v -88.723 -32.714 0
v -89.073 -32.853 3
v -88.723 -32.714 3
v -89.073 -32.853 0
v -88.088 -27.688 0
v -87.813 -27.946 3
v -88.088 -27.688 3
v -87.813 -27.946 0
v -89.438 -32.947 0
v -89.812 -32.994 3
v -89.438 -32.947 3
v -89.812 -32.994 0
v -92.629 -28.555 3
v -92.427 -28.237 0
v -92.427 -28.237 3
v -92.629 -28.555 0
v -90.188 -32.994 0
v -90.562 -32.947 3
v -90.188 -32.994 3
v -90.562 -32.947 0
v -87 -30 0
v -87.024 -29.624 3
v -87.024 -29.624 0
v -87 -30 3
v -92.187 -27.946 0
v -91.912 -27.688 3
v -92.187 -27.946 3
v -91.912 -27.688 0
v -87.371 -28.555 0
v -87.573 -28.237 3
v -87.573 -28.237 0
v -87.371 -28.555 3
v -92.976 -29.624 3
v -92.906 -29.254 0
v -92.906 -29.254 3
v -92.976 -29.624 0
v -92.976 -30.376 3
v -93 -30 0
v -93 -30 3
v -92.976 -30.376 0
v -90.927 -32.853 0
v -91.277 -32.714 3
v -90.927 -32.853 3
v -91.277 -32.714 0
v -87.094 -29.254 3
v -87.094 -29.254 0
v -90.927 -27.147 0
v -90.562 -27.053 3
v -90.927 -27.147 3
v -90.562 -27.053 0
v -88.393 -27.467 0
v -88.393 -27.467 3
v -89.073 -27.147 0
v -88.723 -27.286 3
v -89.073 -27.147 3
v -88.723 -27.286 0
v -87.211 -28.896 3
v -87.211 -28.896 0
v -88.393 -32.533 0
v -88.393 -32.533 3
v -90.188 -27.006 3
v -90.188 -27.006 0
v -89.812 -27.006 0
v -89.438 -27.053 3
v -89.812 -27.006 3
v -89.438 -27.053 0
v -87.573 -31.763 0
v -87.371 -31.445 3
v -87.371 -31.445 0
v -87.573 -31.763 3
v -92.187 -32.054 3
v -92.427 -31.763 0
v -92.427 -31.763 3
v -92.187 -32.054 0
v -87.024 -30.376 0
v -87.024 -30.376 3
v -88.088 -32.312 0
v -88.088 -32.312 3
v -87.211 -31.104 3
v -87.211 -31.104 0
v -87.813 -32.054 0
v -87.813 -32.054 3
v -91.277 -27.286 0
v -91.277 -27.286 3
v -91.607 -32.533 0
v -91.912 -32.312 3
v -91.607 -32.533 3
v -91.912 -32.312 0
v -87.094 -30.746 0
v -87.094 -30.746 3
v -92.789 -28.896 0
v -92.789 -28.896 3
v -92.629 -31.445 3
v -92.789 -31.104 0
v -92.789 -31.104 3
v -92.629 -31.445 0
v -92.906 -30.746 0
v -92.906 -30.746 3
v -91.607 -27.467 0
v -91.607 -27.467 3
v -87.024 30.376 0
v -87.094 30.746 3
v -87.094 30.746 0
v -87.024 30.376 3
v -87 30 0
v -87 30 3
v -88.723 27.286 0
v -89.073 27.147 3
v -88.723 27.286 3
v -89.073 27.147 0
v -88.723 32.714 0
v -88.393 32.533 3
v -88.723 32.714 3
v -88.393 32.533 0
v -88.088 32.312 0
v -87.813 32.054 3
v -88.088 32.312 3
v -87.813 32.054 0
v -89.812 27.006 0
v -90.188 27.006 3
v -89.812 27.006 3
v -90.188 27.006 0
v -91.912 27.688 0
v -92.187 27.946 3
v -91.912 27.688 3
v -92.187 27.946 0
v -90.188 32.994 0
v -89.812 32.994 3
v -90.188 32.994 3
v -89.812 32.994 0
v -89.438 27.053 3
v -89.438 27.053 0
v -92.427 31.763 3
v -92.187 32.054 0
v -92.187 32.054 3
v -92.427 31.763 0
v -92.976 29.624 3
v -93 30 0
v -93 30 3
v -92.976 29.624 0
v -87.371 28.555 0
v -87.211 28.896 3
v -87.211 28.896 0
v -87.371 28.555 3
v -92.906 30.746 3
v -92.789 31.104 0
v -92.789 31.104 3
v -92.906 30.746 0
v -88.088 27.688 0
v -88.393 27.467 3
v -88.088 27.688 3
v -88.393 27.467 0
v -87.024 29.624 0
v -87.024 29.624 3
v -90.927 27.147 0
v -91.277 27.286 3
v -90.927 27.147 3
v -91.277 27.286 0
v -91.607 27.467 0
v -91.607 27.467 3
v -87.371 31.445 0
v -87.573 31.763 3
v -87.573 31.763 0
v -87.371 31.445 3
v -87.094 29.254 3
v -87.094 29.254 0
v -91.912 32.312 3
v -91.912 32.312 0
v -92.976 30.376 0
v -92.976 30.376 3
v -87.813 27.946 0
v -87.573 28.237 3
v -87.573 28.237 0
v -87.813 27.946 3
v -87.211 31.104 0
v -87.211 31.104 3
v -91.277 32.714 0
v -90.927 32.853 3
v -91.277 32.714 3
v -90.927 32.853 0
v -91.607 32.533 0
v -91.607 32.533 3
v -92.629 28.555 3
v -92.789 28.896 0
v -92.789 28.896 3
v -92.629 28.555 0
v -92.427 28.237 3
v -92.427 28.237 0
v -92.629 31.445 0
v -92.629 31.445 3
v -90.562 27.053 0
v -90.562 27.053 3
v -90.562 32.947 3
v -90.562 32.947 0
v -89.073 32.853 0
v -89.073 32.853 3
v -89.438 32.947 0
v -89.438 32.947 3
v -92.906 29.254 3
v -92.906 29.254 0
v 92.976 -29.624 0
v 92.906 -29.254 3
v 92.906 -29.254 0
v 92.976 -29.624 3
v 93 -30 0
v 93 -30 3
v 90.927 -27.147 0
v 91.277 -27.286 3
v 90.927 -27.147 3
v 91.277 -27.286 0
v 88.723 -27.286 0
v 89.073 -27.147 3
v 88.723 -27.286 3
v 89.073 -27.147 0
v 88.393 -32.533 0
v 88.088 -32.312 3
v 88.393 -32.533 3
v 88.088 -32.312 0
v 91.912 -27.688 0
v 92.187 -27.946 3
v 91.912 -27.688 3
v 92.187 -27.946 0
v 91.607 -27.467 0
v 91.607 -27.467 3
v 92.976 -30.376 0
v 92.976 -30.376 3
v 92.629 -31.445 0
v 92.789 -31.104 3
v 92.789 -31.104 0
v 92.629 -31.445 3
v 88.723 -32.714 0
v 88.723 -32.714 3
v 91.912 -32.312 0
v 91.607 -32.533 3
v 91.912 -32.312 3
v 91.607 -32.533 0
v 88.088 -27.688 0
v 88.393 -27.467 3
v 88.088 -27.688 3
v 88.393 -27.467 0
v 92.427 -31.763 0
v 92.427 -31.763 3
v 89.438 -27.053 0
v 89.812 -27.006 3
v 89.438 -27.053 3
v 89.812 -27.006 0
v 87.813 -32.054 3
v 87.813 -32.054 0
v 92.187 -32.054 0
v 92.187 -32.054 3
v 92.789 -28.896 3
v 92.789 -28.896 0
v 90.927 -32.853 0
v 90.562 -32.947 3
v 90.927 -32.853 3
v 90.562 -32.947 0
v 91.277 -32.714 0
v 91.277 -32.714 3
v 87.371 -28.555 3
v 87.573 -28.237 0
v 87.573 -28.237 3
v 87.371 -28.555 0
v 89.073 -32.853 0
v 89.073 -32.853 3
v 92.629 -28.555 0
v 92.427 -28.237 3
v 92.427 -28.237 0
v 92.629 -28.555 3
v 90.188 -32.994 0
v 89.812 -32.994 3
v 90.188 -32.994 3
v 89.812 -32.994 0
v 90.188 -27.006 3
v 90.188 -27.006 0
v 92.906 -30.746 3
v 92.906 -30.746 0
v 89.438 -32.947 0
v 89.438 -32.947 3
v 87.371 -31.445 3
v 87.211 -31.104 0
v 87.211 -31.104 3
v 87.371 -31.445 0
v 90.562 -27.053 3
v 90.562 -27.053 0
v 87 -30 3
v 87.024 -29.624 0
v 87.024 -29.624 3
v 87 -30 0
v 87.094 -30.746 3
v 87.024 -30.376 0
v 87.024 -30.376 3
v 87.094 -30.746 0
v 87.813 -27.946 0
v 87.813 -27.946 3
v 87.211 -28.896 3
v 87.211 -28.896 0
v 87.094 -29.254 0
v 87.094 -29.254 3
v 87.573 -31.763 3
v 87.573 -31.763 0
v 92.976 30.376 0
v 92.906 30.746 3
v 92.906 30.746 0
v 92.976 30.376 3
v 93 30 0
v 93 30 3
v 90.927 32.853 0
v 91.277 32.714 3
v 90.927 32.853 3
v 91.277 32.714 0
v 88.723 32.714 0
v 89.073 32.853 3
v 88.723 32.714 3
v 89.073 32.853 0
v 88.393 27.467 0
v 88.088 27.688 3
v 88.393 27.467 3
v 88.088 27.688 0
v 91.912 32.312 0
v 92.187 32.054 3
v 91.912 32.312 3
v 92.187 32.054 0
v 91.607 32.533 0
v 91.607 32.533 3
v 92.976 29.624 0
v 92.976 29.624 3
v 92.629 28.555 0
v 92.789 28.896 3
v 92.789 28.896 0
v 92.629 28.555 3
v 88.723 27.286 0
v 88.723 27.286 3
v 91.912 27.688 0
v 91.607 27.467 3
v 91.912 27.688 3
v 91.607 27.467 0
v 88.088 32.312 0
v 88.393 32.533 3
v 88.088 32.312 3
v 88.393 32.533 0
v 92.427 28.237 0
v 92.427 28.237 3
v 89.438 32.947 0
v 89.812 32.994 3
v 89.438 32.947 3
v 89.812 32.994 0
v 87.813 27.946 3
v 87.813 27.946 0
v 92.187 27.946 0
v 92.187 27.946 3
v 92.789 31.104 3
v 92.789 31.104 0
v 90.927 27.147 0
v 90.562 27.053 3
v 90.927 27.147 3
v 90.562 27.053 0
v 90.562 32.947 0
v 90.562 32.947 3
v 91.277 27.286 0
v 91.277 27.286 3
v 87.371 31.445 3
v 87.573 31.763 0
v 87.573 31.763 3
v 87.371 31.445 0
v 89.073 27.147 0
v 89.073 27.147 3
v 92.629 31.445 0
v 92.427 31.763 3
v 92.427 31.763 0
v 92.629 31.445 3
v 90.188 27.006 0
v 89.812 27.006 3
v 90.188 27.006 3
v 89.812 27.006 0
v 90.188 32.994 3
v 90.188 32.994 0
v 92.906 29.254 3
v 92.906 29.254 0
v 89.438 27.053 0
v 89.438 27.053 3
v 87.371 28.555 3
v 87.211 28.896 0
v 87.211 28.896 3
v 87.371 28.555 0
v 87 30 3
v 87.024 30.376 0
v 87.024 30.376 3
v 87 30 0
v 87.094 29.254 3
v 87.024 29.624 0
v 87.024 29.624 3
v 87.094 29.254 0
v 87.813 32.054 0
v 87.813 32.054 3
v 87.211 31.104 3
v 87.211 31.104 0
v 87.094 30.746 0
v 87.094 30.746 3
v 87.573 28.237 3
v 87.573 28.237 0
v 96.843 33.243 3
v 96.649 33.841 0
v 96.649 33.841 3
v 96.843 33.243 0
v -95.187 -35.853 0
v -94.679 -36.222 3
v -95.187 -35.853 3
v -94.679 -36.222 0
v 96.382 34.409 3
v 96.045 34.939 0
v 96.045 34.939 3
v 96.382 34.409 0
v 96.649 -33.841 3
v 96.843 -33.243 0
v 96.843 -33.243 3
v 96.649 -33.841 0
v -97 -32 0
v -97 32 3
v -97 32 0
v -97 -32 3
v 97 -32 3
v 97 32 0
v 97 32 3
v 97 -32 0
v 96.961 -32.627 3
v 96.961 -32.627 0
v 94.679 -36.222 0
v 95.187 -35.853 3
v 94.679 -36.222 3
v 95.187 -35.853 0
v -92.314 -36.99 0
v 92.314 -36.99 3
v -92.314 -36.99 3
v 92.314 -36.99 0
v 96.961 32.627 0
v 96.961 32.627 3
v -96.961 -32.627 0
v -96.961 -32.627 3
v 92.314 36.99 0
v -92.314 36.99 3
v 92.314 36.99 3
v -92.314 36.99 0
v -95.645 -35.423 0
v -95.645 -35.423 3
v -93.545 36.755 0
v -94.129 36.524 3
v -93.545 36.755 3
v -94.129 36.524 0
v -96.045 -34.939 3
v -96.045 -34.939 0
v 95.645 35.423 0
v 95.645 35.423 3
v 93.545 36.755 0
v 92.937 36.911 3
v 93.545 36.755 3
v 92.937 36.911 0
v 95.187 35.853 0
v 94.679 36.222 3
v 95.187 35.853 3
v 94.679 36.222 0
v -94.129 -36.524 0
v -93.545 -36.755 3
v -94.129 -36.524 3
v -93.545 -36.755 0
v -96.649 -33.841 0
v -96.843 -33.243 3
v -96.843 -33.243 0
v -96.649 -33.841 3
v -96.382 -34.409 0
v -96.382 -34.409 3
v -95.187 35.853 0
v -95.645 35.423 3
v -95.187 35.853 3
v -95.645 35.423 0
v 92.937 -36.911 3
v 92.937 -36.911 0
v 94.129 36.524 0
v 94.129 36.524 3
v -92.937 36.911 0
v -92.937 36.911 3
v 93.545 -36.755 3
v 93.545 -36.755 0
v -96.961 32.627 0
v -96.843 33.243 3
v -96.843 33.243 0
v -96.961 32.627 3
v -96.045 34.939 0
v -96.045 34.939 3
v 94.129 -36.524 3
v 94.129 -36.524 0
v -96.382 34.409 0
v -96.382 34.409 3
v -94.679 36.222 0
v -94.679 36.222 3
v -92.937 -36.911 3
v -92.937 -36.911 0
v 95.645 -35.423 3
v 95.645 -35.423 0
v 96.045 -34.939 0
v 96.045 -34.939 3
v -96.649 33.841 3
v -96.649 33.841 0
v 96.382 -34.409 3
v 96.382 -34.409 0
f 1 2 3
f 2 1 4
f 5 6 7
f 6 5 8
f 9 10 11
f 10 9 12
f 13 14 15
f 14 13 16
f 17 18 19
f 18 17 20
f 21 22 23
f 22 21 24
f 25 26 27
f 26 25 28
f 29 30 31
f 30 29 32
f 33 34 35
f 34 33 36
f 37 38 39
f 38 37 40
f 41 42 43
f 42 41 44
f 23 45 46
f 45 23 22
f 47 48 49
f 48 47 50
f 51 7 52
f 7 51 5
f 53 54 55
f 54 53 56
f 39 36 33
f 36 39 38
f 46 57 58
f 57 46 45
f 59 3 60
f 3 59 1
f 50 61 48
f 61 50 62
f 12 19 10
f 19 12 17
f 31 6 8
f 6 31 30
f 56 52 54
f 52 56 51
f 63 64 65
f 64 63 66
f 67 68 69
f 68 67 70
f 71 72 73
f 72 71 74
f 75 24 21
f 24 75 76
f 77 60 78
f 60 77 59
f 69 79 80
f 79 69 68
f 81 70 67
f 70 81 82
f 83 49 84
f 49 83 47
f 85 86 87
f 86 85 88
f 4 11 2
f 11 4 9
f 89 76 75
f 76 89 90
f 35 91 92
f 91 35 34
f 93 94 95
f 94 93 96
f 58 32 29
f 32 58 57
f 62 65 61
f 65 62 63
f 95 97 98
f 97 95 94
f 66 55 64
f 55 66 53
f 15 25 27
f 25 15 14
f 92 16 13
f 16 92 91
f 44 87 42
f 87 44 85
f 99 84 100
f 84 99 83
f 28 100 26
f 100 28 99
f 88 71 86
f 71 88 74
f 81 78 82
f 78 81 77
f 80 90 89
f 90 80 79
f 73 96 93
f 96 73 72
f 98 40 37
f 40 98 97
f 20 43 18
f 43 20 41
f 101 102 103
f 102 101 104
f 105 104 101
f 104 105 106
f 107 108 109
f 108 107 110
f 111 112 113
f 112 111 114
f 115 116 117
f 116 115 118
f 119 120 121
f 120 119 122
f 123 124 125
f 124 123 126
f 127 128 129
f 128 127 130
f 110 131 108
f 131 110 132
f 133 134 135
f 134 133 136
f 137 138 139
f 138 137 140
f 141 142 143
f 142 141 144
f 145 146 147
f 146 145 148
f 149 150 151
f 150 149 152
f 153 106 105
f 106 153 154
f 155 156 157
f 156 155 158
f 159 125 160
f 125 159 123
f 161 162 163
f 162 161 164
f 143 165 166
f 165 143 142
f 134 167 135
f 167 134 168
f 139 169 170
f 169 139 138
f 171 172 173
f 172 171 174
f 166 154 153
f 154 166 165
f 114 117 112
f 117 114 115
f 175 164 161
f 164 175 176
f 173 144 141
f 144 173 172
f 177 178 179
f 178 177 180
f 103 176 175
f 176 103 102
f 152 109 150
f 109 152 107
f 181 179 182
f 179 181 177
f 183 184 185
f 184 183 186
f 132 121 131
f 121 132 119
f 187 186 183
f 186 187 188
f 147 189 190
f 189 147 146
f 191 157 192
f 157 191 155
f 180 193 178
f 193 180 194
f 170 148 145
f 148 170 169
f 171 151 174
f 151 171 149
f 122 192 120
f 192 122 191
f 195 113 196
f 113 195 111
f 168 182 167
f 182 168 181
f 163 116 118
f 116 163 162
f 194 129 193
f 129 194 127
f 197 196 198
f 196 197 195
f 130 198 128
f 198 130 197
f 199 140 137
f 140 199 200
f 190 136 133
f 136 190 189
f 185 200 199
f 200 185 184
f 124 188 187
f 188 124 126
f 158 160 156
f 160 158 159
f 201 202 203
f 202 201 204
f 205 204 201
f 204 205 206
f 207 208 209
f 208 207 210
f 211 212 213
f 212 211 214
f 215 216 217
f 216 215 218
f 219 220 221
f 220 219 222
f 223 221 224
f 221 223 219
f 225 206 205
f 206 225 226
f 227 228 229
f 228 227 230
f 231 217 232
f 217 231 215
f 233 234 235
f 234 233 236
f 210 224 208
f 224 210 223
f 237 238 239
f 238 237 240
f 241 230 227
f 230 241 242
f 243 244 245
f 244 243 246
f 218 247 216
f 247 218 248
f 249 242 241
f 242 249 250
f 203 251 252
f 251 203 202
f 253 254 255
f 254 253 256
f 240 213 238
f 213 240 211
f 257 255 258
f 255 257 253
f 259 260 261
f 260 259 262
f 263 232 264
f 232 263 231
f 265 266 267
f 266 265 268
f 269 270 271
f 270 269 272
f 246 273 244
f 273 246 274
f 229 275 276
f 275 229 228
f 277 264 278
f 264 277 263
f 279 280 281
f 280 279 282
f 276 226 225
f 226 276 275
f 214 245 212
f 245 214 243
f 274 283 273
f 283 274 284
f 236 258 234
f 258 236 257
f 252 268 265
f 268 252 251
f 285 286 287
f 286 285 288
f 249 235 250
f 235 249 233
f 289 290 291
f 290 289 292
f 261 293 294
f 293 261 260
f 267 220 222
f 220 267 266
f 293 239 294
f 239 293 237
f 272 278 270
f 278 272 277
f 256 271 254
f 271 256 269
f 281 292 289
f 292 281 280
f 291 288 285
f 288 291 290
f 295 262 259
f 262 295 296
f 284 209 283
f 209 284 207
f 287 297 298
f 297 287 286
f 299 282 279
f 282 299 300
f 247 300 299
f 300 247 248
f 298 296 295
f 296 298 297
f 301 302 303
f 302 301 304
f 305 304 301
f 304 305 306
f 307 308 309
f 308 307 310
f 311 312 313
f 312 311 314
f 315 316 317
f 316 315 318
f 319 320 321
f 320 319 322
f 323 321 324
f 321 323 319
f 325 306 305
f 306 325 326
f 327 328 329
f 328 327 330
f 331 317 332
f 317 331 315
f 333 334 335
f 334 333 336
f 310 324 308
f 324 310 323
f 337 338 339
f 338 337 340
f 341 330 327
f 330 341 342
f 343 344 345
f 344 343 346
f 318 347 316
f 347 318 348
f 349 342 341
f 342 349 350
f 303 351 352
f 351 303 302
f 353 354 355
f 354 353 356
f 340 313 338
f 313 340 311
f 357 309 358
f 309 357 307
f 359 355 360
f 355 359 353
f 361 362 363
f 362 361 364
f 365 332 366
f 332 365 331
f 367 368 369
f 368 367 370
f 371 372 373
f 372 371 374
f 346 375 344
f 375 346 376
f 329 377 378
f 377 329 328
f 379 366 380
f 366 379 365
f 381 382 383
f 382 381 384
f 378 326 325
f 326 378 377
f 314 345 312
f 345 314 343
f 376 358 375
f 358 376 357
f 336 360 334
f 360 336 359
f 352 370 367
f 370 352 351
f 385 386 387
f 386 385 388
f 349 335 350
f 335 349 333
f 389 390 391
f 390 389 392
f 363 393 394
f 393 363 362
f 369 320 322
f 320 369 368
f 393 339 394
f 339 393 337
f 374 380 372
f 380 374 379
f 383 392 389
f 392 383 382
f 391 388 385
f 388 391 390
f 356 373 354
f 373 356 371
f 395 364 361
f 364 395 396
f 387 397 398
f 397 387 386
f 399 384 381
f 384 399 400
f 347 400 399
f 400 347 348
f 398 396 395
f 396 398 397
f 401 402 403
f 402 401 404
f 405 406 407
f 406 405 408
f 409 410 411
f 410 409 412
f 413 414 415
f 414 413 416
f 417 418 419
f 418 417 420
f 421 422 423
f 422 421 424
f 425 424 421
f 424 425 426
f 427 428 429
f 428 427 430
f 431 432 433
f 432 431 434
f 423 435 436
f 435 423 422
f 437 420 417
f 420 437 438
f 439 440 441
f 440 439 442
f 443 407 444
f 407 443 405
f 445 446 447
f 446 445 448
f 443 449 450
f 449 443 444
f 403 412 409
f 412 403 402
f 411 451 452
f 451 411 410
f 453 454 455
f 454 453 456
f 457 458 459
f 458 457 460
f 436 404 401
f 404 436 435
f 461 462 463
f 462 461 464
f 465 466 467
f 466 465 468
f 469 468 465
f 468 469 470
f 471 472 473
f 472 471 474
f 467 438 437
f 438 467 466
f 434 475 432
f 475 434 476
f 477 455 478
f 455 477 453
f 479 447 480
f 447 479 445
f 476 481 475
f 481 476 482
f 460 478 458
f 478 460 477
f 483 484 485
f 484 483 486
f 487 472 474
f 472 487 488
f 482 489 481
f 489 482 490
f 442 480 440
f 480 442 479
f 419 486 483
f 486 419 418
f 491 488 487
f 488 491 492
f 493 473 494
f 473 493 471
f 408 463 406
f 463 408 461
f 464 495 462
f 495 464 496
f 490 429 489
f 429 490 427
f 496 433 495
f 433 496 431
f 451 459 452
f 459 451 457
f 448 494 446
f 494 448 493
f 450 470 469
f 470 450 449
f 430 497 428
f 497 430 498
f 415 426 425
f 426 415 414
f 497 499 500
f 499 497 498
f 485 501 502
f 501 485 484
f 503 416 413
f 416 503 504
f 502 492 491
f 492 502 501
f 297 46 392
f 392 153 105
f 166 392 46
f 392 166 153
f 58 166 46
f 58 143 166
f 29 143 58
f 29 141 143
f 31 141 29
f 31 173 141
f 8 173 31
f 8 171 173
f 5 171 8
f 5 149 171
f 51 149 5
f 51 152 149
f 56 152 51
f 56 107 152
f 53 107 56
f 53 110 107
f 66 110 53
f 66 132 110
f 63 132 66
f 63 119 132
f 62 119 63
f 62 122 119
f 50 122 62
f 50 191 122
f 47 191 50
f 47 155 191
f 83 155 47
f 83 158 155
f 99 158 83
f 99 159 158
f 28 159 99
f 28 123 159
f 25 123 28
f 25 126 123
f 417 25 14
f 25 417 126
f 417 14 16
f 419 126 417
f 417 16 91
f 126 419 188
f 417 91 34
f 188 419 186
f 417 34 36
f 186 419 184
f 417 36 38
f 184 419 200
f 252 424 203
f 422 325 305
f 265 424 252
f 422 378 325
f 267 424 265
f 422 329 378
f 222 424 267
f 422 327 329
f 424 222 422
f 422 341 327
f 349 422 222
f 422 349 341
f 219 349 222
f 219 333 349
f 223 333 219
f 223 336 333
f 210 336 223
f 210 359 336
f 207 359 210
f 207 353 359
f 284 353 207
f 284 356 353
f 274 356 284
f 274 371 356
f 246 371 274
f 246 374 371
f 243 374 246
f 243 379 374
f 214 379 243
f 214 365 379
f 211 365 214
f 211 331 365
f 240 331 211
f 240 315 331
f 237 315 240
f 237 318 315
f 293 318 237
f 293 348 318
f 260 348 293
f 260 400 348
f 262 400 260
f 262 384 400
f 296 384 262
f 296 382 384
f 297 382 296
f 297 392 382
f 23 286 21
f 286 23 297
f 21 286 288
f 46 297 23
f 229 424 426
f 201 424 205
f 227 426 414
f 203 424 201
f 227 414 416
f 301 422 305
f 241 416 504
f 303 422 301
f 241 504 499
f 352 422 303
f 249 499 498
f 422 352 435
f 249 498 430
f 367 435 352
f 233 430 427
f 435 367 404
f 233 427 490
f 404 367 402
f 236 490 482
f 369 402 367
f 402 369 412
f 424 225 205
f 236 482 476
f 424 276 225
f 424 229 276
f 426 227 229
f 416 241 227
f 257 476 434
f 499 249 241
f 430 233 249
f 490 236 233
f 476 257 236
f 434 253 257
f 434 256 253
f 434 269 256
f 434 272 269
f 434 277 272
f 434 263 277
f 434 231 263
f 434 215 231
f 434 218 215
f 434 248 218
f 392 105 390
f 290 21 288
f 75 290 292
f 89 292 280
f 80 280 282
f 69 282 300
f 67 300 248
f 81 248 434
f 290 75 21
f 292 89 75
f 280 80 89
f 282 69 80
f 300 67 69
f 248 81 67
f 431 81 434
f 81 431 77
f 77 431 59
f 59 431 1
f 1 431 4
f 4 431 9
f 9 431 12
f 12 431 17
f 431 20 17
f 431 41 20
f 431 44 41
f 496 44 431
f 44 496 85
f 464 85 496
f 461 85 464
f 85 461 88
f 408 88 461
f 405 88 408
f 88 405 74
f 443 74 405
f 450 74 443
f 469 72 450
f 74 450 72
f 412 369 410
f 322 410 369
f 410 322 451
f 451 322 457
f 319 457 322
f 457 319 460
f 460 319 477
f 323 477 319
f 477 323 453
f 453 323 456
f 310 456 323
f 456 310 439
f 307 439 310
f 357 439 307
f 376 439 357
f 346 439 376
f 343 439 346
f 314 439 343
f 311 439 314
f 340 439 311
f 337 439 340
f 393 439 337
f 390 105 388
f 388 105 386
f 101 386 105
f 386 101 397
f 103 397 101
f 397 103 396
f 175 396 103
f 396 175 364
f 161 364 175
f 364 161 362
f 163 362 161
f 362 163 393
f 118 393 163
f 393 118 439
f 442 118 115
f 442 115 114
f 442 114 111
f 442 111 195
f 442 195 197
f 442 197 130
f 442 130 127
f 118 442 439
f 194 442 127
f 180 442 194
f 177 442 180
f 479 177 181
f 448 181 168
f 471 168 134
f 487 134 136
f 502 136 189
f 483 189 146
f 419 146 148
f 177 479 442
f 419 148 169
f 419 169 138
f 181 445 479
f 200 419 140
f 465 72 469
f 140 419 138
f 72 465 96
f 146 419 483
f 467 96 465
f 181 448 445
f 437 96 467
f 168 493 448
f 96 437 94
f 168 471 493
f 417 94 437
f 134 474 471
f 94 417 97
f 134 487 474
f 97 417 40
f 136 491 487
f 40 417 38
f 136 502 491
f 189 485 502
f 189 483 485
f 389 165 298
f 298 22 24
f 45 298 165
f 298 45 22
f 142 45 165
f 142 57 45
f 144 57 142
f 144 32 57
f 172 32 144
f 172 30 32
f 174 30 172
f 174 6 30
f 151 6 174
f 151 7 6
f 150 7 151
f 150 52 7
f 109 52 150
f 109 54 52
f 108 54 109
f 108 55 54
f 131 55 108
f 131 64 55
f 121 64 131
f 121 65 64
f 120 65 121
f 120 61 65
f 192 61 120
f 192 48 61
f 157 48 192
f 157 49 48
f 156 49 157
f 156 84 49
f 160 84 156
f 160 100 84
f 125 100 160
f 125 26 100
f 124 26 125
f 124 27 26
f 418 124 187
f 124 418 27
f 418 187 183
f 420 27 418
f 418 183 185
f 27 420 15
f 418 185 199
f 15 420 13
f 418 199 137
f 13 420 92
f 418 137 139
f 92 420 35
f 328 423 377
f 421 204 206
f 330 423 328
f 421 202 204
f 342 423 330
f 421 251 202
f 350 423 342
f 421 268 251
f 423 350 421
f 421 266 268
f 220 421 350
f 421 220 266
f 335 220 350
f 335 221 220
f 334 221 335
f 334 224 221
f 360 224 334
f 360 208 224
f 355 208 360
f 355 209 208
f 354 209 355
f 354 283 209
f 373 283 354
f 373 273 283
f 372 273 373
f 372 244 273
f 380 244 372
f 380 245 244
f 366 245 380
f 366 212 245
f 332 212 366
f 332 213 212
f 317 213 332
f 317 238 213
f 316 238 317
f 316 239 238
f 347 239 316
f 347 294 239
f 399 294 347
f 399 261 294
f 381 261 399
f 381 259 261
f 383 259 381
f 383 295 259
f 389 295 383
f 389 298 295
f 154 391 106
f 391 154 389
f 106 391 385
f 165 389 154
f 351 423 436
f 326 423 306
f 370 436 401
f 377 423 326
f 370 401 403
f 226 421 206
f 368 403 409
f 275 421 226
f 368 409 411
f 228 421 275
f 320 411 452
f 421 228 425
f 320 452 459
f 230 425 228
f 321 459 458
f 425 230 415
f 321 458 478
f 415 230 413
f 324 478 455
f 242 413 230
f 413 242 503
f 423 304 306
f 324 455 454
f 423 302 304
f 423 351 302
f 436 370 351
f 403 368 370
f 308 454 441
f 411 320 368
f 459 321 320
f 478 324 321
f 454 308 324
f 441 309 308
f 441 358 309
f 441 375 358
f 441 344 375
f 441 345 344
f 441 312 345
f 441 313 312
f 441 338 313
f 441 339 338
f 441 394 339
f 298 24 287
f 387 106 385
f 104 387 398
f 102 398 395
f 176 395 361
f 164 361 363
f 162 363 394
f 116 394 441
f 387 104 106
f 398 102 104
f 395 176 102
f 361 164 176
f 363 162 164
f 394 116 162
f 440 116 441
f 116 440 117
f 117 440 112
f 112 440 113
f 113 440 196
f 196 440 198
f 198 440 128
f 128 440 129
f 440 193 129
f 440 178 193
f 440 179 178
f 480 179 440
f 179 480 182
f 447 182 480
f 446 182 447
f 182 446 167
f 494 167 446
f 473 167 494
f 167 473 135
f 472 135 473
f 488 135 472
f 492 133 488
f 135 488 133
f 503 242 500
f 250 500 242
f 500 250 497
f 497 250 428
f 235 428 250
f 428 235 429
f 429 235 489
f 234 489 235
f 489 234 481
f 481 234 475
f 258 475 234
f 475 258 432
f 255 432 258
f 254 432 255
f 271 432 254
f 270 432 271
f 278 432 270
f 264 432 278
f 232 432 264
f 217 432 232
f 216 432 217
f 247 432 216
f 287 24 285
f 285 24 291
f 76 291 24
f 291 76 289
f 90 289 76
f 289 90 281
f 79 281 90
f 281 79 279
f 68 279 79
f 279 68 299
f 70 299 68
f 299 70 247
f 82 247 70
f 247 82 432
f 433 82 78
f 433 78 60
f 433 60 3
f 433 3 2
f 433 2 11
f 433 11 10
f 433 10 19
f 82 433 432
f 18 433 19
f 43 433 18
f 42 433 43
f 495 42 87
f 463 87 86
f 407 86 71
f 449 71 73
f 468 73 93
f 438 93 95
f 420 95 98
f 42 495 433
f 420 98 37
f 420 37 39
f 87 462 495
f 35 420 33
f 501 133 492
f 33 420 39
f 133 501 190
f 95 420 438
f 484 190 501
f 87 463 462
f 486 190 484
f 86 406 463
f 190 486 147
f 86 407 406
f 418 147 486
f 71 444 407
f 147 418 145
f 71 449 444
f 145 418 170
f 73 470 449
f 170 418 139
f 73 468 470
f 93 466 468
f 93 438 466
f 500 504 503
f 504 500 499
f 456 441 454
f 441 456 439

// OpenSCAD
$fn = 50;


difference() {
	union() {
		hull() {
			translate(v = [-92.0000000000, 32.0000000000, 0]) {
				cylinder(h = 3, r = 5);
			}
			translate(v = [92.0000000000, 32.0000000000, 0]) {
				cylinder(h = 3, r = 5);
			}
			translate(v = [-92.0000000000, -32.0000000000, 0]) {
				cylinder(h = 3, r = 5);
			}
			translate(v = [92.0000000000, -32.0000000000, 0]) {
				cylinder(h = 3, r = 5);
			}
		}
	}
	union() {
		translate(v = [-90.0000000000, -30.0000000000, -100.0000000000]) {
			cylinder(h = 200, r = 3.0000000000);
		}
		translate(v = [-90.0000000000, 30.0000000000, -100.0000000000]) {
			cylinder(h = 200, r = 3.0000000000);
		}
		translate(v = [90.0000000000, -30.0000000000, -100.0000000000]) {
			cylinder(h = 200, r = 3.0000000000);
		}
		translate(v = [90.0000000000, 30.0000000000, -100.0000000000]) {
			cylinder(h = 200, r = 3.0000000000);
		}
	}
}
